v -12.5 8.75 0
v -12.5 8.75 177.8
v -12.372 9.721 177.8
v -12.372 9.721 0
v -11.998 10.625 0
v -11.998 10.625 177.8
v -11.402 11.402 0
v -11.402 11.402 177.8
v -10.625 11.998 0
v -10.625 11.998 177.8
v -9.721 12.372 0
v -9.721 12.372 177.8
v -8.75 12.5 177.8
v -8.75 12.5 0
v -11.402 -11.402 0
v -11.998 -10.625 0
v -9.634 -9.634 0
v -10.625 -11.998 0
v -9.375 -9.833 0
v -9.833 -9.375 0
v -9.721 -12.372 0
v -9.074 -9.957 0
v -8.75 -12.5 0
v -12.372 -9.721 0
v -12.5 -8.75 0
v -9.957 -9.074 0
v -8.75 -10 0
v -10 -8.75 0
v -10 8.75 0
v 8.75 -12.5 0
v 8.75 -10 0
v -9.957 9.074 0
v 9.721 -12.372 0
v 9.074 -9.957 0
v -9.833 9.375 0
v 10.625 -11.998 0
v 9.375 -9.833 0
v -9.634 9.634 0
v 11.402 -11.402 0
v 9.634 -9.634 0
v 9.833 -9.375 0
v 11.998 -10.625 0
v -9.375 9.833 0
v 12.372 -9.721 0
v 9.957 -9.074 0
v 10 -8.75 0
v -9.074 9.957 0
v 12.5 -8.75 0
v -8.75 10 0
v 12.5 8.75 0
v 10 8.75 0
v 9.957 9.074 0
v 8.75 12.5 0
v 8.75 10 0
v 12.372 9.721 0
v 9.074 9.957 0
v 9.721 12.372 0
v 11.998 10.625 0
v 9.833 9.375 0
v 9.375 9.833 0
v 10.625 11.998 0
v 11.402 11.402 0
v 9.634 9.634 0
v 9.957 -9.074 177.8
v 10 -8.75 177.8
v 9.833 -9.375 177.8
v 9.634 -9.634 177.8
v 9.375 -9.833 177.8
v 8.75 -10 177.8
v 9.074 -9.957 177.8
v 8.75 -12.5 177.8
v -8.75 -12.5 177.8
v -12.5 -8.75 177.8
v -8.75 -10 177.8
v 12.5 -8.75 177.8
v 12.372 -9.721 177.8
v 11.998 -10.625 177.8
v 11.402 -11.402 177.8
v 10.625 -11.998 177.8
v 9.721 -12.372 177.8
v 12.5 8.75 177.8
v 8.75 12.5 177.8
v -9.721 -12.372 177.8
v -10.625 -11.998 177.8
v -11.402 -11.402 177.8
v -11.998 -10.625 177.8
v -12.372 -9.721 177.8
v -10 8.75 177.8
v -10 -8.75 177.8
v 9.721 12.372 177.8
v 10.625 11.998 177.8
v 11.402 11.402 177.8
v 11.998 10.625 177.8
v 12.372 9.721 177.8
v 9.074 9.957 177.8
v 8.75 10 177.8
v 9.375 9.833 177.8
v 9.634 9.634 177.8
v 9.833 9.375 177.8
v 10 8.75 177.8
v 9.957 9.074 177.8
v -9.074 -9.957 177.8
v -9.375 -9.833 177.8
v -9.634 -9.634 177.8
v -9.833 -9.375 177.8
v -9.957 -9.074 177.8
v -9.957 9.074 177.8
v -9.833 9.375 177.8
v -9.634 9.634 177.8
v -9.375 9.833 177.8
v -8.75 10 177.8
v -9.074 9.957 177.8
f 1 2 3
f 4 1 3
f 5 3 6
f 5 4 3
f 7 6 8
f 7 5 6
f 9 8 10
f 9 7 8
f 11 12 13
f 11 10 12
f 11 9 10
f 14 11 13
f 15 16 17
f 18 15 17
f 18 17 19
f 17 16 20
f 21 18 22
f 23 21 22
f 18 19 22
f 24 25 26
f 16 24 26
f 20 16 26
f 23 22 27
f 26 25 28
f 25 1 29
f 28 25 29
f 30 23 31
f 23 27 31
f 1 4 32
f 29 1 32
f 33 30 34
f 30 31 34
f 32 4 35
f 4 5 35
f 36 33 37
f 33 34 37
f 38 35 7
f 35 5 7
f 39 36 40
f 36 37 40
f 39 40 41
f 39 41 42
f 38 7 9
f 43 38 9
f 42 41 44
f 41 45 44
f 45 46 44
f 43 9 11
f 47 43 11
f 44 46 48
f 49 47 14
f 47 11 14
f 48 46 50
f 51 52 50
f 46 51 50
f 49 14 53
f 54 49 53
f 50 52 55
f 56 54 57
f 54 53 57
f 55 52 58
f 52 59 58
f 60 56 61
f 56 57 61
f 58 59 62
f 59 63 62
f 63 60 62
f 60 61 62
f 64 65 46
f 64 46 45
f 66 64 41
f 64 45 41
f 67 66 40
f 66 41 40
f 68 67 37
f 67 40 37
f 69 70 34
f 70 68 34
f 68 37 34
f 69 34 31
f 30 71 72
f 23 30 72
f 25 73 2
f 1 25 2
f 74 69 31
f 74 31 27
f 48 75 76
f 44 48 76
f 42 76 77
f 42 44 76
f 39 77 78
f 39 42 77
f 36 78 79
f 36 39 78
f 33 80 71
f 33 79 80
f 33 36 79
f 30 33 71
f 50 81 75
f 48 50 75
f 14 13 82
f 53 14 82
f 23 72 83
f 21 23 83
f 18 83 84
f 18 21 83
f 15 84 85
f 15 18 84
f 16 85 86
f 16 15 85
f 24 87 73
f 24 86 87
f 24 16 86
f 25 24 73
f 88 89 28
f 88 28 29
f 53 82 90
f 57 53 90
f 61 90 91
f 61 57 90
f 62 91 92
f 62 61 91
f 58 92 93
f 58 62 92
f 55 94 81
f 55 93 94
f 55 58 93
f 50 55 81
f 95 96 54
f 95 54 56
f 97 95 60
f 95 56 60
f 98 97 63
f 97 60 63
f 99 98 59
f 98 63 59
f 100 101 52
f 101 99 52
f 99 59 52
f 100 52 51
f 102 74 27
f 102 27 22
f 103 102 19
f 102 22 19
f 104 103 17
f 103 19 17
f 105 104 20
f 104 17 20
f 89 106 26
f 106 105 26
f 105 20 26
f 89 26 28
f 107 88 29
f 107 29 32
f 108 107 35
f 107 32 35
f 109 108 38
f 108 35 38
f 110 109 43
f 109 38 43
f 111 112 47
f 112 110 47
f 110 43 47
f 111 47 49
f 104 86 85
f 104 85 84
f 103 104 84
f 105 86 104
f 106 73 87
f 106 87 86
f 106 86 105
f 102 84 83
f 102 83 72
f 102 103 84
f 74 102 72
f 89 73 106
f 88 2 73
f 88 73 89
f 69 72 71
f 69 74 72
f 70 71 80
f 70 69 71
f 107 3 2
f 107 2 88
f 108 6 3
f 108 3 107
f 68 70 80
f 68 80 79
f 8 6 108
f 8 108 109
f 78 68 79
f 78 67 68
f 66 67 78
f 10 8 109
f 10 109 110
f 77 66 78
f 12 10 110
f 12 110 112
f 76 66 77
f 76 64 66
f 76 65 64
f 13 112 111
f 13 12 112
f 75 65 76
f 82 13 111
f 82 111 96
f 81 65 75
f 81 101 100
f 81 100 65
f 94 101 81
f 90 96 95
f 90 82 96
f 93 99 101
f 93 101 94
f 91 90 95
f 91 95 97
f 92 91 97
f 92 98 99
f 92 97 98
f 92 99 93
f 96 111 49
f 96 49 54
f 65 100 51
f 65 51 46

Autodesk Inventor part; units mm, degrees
ref_plane "YZ Plane" through (0, 0, 0) normal (1, 0, 0) x (0, 1, 0)
ref_plane "Start plane" through (0, 0, 0) normal (0, 0, 1) x (1, 0, 0)
ref_plane "End plane" through (0, 0, 177.8) normal (0, 0, 1) x (1, 0, 0)
sketch "Sketch" plane through (0, 0, 0) normal (0, 0, 1) x (1, 0, 0)
  line L0 (-12.5, -8.75) -> (-12.5, 8.75)
  line L1 (-8.75, 12.5) -> (8.75, 12.5)
  line L2 (12.5, 8.75) -> (12.5, -8.75)
  line L3 (8.75, -12.5) -> (-8.75, -12.5)
  arc A0 (-12.5, -8.75) -> (-8.75, -12.5) centre (-8.75, -8.75) ccw
  arc A1 (-8.75, 12.5) -> (-12.5, 8.75) centre (-8.75, 8.75) ccw
  arc A2 (12.5, 8.75) -> (8.75, 12.5) centre (8.75, 8.75) ccw
  arc A3 (8.75, -12.5) -> (12.5, -8.75) centre (8.75, -8.75) ccw
  arc A4 (-8.75, 10) -> (-10, 8.75) centre (-8.75, 8.75) ccw
  line L4 (-8.75, 10) -> (8.75, 10)
  arc A5 (10, 8.75) -> (8.75, 10) centre (8.75, 8.75) ccw
  line L5 (10, 8.75) -> (10, -8.75)
  arc A6 (8.75, -10) -> (10, -8.75) centre (8.75, -8.75) ccw
  line L6 (8.75, -10) -> (-8.75, -10)
  arc A7 (-10, -8.75) -> (-8.75, -10) centre (-8.75, -8.75) ccw
  line L7 (-10, -8.75) -> (-10, 8.75)
  line L8 (0, 18.5873) -> (0, -18.5873) construction
  line L9 (-18.5873, 0) -> (18.5873, 0) construction
  dimension "d7" = 3.75
  dimension "d10" = 25
  dimension "d11" = 25
  dimension "d12" = 2.5
  dimension "d15" = 12.5
  dimension "d16" = 12.5
extrude "Body" add sketch "Sketch" along normal up to surface (177.8 mm away) from surface at 0
sketch "Sketch3" plane through (0, 0, 0) normal (0, 0, 1) x (1, 0, 0)
  line L0 (0, 0) -> (10, 0)
ref_plane "Work Plane3" through (0, 0, 0) normal (0, -1, 0) x (1, 0, 0)
sketch "Sketch4" plane through (0, 0, 0) normal (0, -1, 0) x (1, 0, 0)
  line L0 (-2, 0) -> (12, 0)
  line L1 (-2, 177.8) -> (12, 177.8)
  dimension "d18" = 177.8
equation "\"d7\" = G_IR"
equation "\"d10\" = G_H"
equation "\"d11\" = G_W"
equation "\"d12\" = G_T"
equation "\"d15\" = 0.5 * d10"
equation "\"d16\" = 0.5 * d11"
equation "\"d3\" = G_L"
equation "\"G_W\" = 25"
equation "\"G_H\" = 25"
equation "\"G_T\" = 2.5"
equation "\"G_IR\" = 3.75"
equation "\"G_L\" = d18"
equation "\"G_OFFSET_START\" = 0"
equation "\"G_OFFSET_END\" = 0"
equation "\"d14\" = G_OFFSET_END + B_L"
equation "\"B_L\" = 177.8"
properties part number "ISO 25x25x2.5 00000001"
